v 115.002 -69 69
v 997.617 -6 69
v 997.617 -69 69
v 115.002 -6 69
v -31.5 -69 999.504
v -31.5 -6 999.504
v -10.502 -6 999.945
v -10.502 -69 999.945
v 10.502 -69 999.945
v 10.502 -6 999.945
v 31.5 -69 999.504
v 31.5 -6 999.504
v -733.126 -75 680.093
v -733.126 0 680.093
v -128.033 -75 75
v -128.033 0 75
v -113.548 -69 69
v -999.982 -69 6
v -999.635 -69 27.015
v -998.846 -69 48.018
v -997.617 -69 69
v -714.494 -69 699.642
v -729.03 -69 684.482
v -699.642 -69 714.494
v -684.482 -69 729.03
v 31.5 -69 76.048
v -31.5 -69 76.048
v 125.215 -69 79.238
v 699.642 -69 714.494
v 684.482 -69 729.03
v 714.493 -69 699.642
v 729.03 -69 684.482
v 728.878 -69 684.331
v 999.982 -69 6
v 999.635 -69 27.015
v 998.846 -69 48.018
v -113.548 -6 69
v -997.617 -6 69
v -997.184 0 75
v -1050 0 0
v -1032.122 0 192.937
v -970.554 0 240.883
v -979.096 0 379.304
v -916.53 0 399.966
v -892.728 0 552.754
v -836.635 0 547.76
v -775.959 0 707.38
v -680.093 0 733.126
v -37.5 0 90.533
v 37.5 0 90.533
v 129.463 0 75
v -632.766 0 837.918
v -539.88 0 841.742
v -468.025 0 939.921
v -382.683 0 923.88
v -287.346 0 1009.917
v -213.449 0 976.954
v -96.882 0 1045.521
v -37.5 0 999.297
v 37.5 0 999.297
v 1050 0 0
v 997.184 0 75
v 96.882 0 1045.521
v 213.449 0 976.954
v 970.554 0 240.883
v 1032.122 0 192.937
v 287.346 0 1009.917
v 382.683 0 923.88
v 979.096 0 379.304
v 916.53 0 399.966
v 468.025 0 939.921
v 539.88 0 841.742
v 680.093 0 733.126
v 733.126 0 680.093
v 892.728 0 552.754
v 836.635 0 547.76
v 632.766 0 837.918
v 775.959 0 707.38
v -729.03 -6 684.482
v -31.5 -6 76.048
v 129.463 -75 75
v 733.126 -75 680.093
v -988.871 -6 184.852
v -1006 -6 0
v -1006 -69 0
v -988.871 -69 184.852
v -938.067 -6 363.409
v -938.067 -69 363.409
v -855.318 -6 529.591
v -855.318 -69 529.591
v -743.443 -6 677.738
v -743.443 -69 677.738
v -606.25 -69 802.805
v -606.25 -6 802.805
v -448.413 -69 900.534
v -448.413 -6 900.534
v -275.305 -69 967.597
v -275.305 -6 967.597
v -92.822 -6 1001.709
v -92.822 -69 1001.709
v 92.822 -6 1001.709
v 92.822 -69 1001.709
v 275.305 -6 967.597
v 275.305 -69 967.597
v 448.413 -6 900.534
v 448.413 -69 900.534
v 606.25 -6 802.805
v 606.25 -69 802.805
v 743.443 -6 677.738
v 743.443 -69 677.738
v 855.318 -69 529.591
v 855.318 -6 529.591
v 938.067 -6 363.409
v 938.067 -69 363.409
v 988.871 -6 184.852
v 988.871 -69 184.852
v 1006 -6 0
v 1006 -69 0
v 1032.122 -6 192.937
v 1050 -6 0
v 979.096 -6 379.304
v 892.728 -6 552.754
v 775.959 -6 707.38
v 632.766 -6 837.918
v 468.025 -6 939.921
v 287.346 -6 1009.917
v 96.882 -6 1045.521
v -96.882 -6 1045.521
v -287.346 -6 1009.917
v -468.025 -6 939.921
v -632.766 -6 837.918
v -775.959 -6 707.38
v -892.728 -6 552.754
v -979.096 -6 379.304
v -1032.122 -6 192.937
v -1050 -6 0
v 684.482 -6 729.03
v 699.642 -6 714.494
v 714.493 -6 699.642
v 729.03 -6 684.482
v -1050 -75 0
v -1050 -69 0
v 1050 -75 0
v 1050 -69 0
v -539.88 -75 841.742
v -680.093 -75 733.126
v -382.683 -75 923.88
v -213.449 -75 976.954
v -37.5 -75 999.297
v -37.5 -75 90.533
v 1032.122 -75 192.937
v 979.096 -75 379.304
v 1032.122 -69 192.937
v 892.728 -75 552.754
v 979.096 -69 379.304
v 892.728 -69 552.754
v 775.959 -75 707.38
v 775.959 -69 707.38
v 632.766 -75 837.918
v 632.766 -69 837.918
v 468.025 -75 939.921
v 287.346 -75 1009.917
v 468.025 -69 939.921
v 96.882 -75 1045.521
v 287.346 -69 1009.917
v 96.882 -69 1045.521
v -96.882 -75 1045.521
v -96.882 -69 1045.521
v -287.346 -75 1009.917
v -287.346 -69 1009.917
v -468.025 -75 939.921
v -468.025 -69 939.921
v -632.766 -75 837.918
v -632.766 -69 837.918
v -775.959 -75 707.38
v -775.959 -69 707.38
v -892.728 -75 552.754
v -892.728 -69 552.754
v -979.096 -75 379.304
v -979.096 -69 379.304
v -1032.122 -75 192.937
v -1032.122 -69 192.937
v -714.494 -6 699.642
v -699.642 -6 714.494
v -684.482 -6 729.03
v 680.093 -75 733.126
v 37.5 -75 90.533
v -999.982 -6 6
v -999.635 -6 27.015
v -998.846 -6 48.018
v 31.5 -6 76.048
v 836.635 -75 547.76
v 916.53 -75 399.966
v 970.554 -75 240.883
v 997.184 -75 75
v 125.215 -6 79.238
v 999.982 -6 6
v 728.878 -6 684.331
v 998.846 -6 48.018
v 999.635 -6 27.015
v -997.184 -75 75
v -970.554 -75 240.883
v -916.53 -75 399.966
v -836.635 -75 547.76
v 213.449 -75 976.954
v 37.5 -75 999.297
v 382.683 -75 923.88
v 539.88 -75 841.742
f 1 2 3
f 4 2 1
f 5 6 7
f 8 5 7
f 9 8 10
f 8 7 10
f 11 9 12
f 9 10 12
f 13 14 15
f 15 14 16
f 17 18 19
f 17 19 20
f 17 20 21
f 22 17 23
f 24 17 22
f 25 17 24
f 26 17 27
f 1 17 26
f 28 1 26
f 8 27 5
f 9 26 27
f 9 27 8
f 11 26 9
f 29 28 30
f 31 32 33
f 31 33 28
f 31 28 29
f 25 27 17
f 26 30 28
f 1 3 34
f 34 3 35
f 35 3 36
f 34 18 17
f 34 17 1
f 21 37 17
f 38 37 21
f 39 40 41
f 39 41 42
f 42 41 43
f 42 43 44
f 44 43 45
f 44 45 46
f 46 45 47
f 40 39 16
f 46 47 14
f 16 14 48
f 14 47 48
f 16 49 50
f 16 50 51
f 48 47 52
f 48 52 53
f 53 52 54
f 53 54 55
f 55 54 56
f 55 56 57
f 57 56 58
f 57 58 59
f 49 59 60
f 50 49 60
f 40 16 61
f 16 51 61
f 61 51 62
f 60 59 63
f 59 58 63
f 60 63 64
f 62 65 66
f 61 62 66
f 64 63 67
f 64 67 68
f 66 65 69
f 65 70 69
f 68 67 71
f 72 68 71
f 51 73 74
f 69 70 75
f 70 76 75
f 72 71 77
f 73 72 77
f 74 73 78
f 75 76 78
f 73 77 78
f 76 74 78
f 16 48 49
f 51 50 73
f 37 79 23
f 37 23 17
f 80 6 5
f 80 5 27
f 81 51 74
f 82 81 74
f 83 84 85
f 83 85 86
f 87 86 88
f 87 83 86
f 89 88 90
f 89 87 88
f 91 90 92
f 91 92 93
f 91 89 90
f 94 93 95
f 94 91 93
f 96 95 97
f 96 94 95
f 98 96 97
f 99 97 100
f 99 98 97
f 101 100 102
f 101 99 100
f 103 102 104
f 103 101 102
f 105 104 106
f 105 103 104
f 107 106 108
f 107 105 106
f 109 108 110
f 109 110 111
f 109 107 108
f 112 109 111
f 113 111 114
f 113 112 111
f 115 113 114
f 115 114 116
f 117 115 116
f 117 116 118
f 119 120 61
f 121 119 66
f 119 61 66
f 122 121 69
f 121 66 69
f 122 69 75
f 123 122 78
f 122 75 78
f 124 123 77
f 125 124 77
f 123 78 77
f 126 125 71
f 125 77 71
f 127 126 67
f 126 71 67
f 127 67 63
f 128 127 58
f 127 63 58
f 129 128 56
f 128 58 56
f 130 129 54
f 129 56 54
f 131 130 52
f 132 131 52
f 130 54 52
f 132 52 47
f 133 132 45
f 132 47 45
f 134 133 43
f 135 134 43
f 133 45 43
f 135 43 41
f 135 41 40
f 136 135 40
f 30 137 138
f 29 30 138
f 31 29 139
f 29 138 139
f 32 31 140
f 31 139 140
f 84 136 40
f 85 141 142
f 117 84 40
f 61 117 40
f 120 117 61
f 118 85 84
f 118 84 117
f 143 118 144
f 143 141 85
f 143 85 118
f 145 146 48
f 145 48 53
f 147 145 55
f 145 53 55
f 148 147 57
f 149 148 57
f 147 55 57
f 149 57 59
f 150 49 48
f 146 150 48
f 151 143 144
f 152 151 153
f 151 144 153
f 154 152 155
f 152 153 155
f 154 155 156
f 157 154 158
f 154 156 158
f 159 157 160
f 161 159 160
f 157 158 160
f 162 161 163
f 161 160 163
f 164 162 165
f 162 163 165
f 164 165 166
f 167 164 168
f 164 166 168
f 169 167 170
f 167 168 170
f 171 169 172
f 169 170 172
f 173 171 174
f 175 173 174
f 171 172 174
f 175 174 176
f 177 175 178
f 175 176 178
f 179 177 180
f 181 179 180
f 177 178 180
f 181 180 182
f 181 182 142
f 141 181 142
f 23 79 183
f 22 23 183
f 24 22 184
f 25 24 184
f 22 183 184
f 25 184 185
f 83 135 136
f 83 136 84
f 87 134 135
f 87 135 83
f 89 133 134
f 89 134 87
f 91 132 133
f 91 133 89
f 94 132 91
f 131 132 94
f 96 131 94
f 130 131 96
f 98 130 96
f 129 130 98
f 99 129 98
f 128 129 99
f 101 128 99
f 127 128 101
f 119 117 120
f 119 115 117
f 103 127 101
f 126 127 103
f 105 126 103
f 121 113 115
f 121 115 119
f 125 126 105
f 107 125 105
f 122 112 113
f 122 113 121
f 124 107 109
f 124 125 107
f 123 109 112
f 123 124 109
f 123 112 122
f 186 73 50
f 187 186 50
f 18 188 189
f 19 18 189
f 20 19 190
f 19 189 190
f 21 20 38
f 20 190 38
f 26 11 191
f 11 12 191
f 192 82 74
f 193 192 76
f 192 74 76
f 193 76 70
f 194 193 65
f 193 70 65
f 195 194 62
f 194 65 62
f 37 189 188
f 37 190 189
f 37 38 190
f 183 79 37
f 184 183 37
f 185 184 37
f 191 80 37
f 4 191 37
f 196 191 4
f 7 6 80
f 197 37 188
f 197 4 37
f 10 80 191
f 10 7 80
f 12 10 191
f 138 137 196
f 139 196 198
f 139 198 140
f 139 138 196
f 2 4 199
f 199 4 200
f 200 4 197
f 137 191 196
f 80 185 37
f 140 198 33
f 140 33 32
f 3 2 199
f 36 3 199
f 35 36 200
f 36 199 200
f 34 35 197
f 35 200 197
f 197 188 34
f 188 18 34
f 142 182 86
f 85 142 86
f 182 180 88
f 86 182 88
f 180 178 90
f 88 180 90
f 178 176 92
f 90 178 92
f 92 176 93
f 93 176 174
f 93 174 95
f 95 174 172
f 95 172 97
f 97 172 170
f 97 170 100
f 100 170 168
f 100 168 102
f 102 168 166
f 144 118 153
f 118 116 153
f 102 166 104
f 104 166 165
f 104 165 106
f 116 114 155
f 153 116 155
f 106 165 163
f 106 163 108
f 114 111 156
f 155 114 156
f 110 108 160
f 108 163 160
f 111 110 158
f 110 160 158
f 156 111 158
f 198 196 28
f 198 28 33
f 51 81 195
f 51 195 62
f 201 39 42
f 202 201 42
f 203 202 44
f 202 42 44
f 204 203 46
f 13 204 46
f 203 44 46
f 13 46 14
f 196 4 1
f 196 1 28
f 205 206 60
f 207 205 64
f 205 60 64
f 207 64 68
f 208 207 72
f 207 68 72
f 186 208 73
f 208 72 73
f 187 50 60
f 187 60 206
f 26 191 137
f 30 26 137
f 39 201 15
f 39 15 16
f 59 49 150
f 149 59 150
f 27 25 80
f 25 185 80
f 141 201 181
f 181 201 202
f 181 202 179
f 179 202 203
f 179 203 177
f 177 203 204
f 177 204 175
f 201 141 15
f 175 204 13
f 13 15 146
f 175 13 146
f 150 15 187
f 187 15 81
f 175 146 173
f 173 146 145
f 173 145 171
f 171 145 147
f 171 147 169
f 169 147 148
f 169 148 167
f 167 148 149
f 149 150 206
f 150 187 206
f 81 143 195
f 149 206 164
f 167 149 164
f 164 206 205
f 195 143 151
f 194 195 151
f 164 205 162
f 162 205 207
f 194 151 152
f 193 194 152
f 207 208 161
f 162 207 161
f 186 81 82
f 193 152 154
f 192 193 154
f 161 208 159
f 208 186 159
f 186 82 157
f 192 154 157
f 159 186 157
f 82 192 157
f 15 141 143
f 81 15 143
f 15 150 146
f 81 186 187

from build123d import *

# Parameters (mm, degrees)
F1_DEPTH     = 75
F2_T         = -6
F3_W         = 75
F3_H         = 75
F4_DEPTH     = 1000
F6_W         = 75
F6_H         = 75
F7_DEPTH     = 1000
F9_DEPTH     = 75
F11_DEPTH    = 75
F12_T        = 6
F12_T3_DEPTH = 87
F12_T6_ANGLE = 180.000000001
F12_T8_ANGLE = 180.000000001


# Not quite as in the source:
# - a shell that OpenCascade refuses in one call is made with other operations: the cavity is built on its own and cut out


with BuildPart() as f1:
    # F0 (on Front) → F1 (new body)
    with BuildSketch(Plane.XZ):
        with BuildLine():
            ThreePointArc((707.1067811865, 707.1067811865), (923.8795325113, 382.6834323651), (1000, 0))
            Line((1000, 0), (1050, 0))
            ThreePointArc((1050, 0), (0, 1050), (-1050, 0))
            Line((-1050, 0), (-1000, 0))
            ThreePointArc((-1000, 0), (-923.8795325113, 382.6834323651), (-707.1067811865, 707.1067811865))
            ThreePointArc((-707.1067811865, 707.1067811865), (-382.6834323651, 923.8795325113), (0, 1000))
            ThreePointArc((0, 1000), (382.6834323651, 923.8795325113), (707.1067811865, 707.1067811865))
        make_face()
    extrude(amount=F1_DEPTH)

    # F2
    f2_openings = [f1.faces().sort_by_distance(p)[0] for p in [
        (0, -37.5, 1050),
        (1025, -37.5, 0),
        (-1025, -37.5, 0),
    ]]
    offset(amount=F2_T, openings=f2_openings)

    # F3 (on Right) → F4 (join)
    with BuildSketch(Plane.YZ):
        with Locations((-37.5, 37.5)):
            Rectangle(F3_W, F3_H)
    extrude(amount=F4_DEPTH)

    # F5: F1 across plane


with BuildPart() as f1_1:
    add(f1.part)
    add(f1.part.mirror(Plane.YZ))

    # F6 (on face) → F7 (join)
    with BuildSketch(Plane(origin=(0, 0, 0), x_dir=(1, 0, 0), z_dir=(0, 0, -1))):
        with Locations((0, 37.5)):
            Rectangle(F6_W, F6_H)
    extrude(amount=-F7_DEPTH)

    # F8 (on face) → F9 (join)
    with BuildSketch(Plane.XZ):
        with BuildLine():
            Line((84.9014701911, 30.3333466038), (733.1259261111, 680.0929175221))
            ThreePointArc((733.1259261111, 680.0929175221), (707.1120975666, 707.1120975666), (680.0929175221, 733.1259261111))
            Line((680.0929175221, 733.1259261111), (-22.6996619852, 30.3333466038))
            Line((-22.6996619852, 30.3333466038), (84.9014701911, 30.3333466038))
        make_face()
        Polygon((-27.0138636644, 26.0191449246), (-22.6996619852, 30.3333466038), (-27.0138636644, 30.3333466038), align=None)
    extrude(amount=F9_DEPTH)

    # F10 (on Front) → F11 (join)
    with BuildSketch(Plane.XZ):
        Polygon((-97.2271824132, 44.1941738242), (-27.4779913529, 44.1941738242), (-30.0520382004, 83.0850467894), (-680.5902768921, 733.623285481), (-733.623285481, 680.5902768921), align=None)
    extrude(amount=F11_DEPTH)

    # F12: shell of thickness 6, made by hand


with BuildPart() as f12_core1:
    # F12_t2: copy of F1
    add(f1_1.part)

    # the walls: a layer under each face that stays
    f12_faces = [f12_core1.faces().sort_by_distance(p)[0] for p in [
        (0, 0, 525),
        (0, -37.5, 0),
        (0, -3, 1050),
        (-562.608271174, -37.5, 75),
        (-37.5, -37.5, 544.9148181113),
        (-382.6834323651, -37.5, 923.8795325113),
        (-916.5299048246, -37.5, 399.9661655218),
        (563.3230641949, -37.5, 75),
        (431.2942603709, -37.5, 377.5464587611),
        (916.5299048246, -37.5, 399.9661655218),
        (382.6834323651, -37.5, 923.8795325113),
        (37.5, -37.5, 544.9148181113),
        (358.7964587611, -37.5, 411.82946735),
        (-900, -6, 525),
        (0, -37.5, 1006),
        (-900, -69, 525),
        (0, -72, 1050),
        (0, -75, 525),
        (-430.57946735, -37.5, 377.5464587611),
        (-358.7964587611, -37.5, 411.82946735),
    ]]
    thicken(f12_faces, amount=-F12_T, mode=Mode.SUBTRACT)

    # F12_s4 → F12_t3 (cut)
    with BuildSketch(Plane.XZ.offset(-6)):
        Polygon((-128.0754349959, 75.0175735931), (-128.033008589, 69), (-113.5477272148, 69), (-123.7903679019, 79.2426406871), align=None)
        Polygon((-997.1237027469, 75.0555), (-997.183533759, 69), (-1003.6517512752, 69), (-1003.1666349615, 75.45), align=None)
        Polygon((-37.5175735931, 90.5754349959), (-31.5, 90.533008589), (-31.5, 76.0477272148), (-41.7426406871, 86.2903679019), align=None)
        Polygon((-37.55775, 999.236669836), (-31.5, 999.2966276337), (-31.5, 1005.5260092085), (-37.725, 1005.2924073995), align=None)
        Polygon((-680.0096855402, 733.1243649624), (-684.1734750272, 737.5246816678), (-688.7403961634, 733.2881233782), (-684.3355582092, 728.883285424), align=None)
        Polygon((-733.1243649624, 680.0096855402), (-737.5246816678, 684.1734750272), (-733.2881233782, 688.7403961634), (-728.883285424, 684.3355582092), align=None)
        Polygon((997.1237027469, 75.0555), (997.183533759, 69), (1003.6517512752, 69), (1003.1666349615, 75.45), align=None)
        Polygon((129.5050711853, 75.0176238001), (129.4625946308, 69), (115.0015064822, 69), (125.2149391782, 79.2376199873), align=None)
        Polygon((733.1244151101, 680.0097357472), (728.8782706586, 684.3305375094), (733.2831062303, 688.7458045437), (737.5246816678, 684.1734750272), align=None)
        Polygon((680.0096855402, 733.1243649624), (684.1734750272, 737.5246816678), (688.7403961634, 733.2881233782), (684.3355582092, 728.883285424), align=None)
        Polygon((37.55775, 999.236669836), (37.725, 1005.2924073995), (31.5, 1005.5260092085), (31.5, 999.2966276337), align=None)
        Polygon((37.5175735931, 90.5754349959), (31.5, 90.533008589), (31.5, 76.0477272148), (41.7426406871, 86.2903679019), align=None)
    extrude(amount=F12_T3_DEPTH, mode=Mode.SUBTRACT)

    # F12_s5 → F12_t6 (revolve, cut)
    with BuildSketch(Plane.XY):
        Polygon((-1006.06, -6.06), (-1006, 0), (-1000, 0), (-1000, -6), align=None)
    revolve(axis=Axis((0, -6, 0), (0, 1, 0)), revolution_arc=F12_T6_ANGLE, mode=Mode.SUBTRACT)

    # F12_s7 → F12_t8 (revolve, cut)
    with BuildSketch(Plane.XY):
        Polygon((-1006.06, -68.94), (-1000, -69), (-1000, -75), (-1006, -75), align=None)
    revolve(axis=Axis((0, -69, 0), (0, 1, 0)), revolution_arc=F12_T8_ANGLE, mode=Mode.SUBTRACT)


with BuildPart() as f1_2:
    add(f1_1.part)

    # what is left inside the walls is the cavity
    f12_cavity = [f12_core1.part.solids().sort_by_distance(p)[0] for p in [
        (0, -6.06, 337.333333),
    ]]
    add(f12_cavity, mode=Mode.SUBTRACT)


solid = f1_2.part
